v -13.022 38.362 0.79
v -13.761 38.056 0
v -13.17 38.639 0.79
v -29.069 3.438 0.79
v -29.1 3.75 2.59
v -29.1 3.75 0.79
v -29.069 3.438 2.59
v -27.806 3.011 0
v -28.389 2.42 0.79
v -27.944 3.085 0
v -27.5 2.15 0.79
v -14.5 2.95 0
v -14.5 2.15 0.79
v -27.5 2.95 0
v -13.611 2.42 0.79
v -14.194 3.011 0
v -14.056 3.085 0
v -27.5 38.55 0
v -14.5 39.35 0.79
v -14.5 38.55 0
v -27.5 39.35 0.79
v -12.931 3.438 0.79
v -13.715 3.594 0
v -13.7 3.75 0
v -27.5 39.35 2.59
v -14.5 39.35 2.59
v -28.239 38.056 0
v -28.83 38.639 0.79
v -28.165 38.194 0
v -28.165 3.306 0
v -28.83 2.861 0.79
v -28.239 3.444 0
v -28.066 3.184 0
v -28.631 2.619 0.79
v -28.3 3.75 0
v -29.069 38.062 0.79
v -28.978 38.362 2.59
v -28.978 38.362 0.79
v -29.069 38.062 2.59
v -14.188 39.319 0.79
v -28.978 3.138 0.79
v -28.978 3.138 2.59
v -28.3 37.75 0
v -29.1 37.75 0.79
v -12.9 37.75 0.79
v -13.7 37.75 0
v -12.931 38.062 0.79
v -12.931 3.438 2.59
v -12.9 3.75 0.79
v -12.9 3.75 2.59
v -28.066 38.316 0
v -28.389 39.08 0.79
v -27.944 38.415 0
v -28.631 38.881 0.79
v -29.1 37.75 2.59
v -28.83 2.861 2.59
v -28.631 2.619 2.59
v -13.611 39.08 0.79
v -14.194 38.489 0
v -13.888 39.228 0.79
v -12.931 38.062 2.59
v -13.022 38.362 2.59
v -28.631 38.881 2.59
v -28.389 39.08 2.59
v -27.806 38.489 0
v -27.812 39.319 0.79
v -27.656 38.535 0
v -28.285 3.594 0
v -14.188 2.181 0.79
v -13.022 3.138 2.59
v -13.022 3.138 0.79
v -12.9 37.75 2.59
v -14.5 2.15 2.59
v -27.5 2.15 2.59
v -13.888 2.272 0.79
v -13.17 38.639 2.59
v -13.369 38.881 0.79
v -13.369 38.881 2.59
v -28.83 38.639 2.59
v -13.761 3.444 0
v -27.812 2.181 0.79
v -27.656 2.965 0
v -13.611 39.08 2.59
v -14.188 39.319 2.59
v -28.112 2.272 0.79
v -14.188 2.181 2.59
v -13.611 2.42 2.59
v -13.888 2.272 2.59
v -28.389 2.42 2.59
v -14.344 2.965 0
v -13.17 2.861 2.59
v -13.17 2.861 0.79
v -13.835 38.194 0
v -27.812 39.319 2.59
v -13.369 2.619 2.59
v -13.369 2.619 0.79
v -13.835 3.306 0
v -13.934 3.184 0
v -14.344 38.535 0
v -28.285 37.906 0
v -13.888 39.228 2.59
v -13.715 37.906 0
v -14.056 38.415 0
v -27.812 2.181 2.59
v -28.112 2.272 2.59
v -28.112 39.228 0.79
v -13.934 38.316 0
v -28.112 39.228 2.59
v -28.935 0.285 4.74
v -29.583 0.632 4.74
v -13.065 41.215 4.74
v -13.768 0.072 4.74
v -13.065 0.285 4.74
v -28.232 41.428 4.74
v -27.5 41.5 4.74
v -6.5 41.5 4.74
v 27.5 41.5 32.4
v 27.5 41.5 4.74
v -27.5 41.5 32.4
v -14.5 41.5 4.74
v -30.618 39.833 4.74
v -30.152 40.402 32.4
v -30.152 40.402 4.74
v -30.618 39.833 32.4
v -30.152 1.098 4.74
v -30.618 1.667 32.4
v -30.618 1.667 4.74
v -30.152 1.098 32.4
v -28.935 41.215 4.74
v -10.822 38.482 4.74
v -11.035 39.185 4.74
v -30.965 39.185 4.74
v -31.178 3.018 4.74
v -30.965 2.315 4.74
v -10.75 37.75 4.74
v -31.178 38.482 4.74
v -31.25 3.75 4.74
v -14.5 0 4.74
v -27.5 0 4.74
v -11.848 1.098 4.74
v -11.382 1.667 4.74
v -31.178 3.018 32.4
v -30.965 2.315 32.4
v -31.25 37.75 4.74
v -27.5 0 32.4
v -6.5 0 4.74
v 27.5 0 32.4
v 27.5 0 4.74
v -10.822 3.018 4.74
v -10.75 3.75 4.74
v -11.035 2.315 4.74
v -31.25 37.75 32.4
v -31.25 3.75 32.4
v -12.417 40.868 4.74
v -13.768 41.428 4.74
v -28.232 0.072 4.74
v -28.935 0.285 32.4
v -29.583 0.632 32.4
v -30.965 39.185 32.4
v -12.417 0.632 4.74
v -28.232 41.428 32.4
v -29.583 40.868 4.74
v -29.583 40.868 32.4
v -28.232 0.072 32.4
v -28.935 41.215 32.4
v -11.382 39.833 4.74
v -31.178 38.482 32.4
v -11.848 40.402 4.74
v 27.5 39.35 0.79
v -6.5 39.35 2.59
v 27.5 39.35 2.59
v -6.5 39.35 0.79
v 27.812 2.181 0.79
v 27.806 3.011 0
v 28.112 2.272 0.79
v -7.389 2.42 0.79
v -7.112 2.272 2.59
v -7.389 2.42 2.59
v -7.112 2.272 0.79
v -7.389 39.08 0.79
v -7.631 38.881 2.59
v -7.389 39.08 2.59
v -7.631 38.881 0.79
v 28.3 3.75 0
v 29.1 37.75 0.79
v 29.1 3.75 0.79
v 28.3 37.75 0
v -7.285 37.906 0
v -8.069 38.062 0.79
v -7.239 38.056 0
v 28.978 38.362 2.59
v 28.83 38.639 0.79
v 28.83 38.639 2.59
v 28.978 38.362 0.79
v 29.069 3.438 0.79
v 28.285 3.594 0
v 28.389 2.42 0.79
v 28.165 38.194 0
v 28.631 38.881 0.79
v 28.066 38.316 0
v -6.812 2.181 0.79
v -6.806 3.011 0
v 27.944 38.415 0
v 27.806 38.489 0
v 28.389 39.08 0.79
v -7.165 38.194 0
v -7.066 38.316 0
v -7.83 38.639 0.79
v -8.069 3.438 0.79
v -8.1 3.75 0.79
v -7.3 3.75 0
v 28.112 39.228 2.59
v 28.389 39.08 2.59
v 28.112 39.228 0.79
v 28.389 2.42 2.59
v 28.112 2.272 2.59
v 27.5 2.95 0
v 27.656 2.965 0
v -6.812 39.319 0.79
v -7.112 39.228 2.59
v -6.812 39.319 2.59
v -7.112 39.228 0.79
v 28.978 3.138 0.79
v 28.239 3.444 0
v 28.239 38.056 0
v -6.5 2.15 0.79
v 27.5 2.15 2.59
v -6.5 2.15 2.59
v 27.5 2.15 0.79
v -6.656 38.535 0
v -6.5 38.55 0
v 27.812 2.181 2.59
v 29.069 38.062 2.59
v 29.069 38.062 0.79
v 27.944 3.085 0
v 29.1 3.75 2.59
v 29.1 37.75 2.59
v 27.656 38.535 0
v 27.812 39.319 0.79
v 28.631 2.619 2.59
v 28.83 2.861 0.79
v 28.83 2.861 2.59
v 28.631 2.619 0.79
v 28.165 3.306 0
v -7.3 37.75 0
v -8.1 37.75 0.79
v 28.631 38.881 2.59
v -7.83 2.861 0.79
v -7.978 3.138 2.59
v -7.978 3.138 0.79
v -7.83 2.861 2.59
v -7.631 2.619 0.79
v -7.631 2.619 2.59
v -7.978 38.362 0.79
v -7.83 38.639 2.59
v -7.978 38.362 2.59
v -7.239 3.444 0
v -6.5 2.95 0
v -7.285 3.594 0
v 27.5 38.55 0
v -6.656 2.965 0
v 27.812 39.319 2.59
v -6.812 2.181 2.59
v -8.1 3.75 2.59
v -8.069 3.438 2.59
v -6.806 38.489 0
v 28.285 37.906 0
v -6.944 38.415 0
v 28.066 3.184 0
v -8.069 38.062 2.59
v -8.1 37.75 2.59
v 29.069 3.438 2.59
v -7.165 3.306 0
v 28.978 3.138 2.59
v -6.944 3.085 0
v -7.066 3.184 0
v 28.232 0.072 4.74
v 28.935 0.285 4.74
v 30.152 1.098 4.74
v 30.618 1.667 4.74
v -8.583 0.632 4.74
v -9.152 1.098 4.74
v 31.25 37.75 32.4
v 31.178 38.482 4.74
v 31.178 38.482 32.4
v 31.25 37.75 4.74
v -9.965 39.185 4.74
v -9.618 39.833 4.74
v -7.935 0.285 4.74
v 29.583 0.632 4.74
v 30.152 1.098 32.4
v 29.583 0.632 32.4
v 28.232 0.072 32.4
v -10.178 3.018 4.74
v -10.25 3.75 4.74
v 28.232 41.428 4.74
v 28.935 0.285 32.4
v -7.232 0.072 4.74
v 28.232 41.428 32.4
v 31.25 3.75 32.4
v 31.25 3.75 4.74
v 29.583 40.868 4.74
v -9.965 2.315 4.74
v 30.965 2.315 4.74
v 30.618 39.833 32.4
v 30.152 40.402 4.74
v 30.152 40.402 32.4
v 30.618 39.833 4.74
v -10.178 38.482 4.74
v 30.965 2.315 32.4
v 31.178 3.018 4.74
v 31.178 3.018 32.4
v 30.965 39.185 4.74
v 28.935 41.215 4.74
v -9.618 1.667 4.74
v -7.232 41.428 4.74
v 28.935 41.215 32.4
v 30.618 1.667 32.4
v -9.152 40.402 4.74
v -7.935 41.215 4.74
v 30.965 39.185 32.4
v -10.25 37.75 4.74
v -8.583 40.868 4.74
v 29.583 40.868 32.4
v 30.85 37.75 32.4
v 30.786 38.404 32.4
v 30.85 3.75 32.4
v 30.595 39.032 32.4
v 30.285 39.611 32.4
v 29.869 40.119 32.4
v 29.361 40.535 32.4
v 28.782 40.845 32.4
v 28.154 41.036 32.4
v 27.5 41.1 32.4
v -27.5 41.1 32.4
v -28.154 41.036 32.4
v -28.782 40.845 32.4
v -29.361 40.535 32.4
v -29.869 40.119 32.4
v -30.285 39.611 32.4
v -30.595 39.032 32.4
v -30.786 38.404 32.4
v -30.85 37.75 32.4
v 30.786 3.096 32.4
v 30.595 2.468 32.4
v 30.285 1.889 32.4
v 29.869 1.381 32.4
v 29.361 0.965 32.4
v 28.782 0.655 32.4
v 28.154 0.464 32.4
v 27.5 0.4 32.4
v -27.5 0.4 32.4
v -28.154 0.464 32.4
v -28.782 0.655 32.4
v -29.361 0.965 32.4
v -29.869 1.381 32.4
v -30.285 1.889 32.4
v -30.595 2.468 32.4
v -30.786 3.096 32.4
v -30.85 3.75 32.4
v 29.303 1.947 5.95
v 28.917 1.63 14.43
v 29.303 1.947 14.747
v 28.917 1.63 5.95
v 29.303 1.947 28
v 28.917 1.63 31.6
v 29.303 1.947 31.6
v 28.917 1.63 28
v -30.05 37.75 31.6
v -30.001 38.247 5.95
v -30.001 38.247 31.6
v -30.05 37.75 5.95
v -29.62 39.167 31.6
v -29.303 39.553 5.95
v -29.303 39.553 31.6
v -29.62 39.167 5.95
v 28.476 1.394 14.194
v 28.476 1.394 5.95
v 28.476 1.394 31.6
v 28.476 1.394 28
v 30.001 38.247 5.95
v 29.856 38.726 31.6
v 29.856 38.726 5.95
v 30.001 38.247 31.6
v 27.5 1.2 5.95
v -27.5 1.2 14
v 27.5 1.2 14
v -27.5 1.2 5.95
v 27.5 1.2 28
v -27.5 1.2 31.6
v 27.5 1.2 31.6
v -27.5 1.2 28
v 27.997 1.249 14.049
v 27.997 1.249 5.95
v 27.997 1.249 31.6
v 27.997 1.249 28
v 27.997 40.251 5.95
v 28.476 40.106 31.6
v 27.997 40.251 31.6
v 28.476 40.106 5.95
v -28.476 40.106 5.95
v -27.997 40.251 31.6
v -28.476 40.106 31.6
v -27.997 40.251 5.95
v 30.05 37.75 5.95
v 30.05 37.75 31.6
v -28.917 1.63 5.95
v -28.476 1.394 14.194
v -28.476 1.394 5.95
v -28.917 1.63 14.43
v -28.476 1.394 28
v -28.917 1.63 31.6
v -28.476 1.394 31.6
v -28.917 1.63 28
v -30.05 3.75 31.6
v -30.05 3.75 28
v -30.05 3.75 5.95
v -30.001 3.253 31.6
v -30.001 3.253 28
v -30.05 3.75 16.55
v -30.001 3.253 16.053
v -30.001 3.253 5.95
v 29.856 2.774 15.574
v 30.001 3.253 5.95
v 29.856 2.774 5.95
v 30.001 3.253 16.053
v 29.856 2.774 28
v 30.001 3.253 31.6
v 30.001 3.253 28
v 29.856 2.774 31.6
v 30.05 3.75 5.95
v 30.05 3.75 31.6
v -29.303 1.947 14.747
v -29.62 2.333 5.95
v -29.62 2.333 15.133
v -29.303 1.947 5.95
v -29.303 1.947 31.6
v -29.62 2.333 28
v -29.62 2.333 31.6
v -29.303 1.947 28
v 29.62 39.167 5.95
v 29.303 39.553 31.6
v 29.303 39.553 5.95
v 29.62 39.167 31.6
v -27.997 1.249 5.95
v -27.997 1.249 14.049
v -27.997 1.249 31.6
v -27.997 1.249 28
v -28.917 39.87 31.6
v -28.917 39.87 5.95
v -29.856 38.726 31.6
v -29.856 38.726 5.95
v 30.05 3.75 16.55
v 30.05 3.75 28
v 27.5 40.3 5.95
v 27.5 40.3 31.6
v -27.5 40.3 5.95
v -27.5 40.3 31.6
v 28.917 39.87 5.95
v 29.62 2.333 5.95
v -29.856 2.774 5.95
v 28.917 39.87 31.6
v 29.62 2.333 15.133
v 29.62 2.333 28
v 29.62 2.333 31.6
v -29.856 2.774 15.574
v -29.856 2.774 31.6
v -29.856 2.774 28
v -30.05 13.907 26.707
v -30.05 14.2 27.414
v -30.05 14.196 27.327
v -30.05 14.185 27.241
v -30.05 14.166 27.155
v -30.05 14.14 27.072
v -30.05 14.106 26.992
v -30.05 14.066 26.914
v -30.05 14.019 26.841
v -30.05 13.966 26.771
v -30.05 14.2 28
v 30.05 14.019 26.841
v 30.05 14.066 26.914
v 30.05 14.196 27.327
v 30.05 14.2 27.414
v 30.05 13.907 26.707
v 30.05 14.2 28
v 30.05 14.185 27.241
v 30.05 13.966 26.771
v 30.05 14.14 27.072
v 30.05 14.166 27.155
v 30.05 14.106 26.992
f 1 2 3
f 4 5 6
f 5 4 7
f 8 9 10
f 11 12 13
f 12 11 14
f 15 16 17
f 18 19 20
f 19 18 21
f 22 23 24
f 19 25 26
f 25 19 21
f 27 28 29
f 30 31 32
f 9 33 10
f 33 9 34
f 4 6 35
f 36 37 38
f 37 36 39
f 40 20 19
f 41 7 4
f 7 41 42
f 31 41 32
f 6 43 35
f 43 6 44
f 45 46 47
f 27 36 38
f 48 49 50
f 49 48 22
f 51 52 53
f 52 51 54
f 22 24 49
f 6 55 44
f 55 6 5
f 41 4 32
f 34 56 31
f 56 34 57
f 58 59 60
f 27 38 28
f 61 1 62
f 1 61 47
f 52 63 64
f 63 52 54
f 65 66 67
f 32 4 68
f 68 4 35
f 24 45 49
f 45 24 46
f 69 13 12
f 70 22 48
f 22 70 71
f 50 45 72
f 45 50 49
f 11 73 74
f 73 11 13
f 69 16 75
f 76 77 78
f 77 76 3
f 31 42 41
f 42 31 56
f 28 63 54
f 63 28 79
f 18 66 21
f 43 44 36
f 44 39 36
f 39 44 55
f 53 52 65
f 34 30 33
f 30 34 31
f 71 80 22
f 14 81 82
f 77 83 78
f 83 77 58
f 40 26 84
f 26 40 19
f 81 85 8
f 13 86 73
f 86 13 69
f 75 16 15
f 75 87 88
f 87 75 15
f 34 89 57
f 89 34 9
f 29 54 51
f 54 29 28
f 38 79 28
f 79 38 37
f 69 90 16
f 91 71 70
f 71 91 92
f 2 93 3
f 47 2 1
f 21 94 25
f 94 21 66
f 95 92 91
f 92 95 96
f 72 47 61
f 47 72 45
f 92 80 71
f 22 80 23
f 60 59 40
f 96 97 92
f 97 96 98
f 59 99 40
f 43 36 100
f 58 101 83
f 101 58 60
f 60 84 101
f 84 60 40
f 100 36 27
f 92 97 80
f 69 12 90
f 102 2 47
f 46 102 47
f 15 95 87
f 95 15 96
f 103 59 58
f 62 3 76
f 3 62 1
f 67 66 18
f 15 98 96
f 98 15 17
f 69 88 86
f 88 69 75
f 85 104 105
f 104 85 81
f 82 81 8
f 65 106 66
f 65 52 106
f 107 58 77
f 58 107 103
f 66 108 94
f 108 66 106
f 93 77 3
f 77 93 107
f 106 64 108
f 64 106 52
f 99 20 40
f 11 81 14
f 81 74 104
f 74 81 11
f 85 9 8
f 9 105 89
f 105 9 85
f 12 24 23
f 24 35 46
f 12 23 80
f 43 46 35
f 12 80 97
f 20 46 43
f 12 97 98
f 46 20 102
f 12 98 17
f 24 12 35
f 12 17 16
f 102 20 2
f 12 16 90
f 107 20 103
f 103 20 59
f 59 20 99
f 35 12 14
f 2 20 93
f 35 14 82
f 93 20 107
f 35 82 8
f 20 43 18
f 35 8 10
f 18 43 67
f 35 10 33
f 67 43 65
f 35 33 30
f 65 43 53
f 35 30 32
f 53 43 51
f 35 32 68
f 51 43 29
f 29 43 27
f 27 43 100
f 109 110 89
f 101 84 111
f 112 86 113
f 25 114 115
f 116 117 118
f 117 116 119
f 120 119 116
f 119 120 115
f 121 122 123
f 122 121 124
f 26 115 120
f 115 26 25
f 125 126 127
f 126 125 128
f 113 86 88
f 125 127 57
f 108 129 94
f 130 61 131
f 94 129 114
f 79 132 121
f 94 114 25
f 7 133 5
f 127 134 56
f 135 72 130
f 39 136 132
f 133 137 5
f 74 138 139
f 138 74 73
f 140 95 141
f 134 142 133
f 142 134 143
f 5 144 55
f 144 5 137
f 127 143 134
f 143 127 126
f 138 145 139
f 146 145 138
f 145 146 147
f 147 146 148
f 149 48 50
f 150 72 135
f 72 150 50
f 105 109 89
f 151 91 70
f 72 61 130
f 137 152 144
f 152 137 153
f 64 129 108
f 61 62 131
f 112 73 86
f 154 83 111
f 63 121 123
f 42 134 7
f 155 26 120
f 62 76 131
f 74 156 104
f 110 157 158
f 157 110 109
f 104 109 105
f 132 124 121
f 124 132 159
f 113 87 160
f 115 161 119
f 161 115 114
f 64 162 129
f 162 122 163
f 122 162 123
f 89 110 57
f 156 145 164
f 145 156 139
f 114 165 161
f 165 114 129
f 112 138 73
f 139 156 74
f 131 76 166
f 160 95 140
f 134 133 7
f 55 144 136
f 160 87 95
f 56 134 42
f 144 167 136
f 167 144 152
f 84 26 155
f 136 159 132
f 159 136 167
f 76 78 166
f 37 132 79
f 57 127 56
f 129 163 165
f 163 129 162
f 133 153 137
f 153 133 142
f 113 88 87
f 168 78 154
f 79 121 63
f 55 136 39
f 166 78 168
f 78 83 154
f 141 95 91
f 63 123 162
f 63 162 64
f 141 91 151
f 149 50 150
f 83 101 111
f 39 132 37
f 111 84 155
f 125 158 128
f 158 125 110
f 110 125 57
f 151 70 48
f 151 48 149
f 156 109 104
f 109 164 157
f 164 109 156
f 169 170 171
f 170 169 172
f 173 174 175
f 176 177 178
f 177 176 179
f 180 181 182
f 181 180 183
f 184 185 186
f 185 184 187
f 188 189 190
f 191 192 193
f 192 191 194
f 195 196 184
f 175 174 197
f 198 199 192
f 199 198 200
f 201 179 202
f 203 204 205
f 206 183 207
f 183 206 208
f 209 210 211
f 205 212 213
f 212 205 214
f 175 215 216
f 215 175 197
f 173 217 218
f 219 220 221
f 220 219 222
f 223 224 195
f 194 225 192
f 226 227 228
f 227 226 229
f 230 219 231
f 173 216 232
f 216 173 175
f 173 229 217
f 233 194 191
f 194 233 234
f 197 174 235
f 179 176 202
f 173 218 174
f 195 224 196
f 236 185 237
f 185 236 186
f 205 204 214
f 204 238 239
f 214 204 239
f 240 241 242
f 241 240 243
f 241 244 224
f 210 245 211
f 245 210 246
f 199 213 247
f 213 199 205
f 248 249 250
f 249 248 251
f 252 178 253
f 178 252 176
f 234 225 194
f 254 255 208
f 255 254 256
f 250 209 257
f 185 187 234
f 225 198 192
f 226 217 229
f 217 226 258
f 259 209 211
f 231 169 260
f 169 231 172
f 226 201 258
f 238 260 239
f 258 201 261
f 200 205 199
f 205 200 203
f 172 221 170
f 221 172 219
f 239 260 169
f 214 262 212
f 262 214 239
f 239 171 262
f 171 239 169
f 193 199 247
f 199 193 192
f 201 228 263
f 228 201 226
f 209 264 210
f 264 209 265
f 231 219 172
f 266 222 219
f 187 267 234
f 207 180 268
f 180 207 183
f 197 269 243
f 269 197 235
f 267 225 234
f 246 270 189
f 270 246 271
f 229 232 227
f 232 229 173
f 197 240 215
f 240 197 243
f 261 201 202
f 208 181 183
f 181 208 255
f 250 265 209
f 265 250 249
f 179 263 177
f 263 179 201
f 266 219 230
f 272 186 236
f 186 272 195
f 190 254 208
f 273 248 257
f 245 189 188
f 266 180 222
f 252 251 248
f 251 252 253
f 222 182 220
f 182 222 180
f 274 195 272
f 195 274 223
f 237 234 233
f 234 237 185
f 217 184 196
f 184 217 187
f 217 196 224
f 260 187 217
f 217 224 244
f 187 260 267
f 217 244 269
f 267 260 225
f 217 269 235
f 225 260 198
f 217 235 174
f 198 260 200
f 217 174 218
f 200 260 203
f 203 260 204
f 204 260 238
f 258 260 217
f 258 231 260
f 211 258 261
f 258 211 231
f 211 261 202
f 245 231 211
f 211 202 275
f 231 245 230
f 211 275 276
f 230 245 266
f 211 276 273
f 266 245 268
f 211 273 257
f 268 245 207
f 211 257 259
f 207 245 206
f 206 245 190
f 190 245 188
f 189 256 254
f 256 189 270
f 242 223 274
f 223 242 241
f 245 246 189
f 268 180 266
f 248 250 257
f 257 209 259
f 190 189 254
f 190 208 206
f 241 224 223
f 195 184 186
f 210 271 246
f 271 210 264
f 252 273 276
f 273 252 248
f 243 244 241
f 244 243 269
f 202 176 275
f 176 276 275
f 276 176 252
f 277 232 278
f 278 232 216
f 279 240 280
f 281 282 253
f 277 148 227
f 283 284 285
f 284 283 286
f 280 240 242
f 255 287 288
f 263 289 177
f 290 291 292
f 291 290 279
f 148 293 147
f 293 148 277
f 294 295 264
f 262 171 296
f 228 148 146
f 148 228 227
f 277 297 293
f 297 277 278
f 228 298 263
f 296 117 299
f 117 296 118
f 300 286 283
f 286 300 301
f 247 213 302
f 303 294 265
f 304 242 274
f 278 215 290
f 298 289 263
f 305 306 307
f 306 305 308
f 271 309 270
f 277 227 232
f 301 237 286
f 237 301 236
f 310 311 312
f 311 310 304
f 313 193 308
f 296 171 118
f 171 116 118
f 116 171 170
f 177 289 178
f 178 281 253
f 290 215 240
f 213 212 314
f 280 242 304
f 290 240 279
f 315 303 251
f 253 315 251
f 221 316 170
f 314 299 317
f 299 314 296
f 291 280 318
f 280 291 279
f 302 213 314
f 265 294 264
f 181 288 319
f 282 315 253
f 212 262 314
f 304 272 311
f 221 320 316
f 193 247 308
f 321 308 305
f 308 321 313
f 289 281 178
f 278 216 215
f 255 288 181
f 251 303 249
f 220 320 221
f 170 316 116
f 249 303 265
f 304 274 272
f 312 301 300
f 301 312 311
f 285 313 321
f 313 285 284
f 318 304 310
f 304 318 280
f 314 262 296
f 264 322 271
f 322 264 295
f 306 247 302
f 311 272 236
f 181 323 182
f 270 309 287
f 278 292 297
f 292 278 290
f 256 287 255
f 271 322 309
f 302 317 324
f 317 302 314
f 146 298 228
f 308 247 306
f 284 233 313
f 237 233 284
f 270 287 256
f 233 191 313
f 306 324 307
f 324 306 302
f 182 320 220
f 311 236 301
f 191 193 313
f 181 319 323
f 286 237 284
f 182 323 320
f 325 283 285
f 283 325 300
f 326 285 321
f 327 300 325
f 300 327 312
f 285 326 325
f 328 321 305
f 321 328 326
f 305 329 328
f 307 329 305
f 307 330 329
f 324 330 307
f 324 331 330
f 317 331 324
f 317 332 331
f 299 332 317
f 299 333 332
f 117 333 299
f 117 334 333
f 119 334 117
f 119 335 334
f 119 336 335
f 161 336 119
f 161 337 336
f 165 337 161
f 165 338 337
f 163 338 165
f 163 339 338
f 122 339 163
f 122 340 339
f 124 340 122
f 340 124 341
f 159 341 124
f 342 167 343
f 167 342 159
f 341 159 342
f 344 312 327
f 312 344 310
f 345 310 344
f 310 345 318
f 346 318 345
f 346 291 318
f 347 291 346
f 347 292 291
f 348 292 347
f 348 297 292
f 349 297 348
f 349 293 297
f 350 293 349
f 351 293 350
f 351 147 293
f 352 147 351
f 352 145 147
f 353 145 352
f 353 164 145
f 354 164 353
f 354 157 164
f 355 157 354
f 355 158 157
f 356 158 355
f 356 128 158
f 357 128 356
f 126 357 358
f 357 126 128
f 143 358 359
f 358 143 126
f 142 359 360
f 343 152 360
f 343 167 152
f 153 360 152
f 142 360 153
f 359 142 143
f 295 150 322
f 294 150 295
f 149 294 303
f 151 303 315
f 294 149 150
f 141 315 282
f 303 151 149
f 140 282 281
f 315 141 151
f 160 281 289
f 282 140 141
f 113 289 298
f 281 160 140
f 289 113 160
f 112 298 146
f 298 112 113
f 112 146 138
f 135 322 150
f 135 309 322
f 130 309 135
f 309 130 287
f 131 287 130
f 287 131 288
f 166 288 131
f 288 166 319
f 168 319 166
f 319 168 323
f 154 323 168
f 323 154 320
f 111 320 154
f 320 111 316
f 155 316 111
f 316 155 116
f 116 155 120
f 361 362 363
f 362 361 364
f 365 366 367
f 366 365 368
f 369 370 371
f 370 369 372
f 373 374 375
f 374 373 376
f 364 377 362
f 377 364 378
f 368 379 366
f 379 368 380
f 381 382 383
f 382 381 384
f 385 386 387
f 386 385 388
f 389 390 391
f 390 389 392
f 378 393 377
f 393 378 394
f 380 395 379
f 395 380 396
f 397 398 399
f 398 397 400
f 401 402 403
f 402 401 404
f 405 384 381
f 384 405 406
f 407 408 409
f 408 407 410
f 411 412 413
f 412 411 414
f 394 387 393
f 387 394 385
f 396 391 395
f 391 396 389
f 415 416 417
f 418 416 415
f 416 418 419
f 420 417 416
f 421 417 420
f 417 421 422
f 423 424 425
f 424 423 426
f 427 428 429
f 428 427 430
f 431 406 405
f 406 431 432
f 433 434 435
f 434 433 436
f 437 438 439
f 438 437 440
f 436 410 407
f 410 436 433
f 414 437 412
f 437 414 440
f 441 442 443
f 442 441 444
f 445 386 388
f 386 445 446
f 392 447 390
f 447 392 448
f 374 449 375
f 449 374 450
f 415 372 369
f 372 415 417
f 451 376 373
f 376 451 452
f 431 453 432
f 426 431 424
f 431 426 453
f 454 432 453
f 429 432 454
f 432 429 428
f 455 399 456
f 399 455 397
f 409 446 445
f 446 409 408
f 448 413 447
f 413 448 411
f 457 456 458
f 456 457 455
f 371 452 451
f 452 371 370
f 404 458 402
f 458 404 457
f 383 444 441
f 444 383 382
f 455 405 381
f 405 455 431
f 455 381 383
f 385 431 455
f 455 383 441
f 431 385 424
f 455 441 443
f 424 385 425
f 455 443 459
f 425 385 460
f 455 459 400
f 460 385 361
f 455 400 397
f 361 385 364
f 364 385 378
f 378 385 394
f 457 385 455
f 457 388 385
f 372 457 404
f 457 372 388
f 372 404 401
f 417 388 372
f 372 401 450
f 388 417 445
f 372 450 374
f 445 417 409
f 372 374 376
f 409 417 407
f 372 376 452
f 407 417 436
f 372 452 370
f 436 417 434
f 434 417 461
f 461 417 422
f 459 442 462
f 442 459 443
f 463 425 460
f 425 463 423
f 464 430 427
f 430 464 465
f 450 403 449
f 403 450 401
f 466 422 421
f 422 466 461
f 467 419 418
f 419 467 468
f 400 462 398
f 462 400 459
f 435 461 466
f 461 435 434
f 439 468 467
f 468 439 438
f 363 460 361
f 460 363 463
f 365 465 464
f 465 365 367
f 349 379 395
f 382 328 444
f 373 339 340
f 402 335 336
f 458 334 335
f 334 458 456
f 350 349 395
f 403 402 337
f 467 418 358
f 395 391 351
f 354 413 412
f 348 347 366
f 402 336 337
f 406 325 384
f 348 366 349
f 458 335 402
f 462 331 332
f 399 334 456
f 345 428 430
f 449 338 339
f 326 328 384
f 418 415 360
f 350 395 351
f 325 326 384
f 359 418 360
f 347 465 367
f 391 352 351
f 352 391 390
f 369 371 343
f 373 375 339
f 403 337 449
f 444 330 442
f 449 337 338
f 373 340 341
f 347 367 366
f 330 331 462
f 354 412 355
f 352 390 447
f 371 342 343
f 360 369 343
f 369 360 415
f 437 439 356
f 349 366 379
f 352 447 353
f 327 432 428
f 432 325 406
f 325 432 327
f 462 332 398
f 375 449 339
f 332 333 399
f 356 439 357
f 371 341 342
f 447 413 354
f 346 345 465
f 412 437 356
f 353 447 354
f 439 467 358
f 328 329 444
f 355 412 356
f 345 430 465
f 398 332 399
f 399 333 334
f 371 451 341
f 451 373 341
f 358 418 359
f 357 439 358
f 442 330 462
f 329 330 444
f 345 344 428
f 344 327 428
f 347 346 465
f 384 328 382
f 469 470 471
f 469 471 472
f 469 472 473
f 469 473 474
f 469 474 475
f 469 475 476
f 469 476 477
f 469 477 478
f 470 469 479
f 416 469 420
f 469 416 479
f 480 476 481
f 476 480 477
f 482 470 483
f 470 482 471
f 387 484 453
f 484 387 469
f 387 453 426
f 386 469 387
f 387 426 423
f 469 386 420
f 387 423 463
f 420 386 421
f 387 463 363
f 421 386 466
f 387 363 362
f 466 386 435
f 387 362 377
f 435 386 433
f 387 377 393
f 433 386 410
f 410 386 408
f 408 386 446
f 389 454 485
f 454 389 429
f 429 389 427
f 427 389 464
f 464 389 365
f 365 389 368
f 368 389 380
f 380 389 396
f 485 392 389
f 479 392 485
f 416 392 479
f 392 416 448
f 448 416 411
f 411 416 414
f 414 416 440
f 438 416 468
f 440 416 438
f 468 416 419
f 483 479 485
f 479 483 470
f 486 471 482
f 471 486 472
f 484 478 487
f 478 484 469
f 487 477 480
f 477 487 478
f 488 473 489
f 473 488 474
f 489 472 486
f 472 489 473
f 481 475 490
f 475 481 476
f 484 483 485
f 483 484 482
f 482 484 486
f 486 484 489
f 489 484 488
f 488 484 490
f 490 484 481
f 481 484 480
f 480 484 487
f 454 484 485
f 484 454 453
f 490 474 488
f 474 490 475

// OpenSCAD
// file: ../../../modules/gridfinity.scad
// Gridfinity ベースプレートの共有 module。
// 寸法は Gridfinity 仕様 (Zack Freedman) の baseplate 輪郭に従う:
//   ピッチ 42、ソケット上端開口 41.5 (角 R4)、上から 45° 面取り 2.15 →
//   垂直 1.8 (37.2 角・R1.85) → 45° 面取り 0.7 → 底 35.8 角 (R1.15)。
//   ソケット深さ = 2.15 + 1.8 + 0.7 = 4.65。
//
// 座標系: X が列方向 (中央が 0)、Y が行方向 (板の前端が 0)、Z=0 が板の底面。
// 板の外形は grid とは独立に rim で与えるので、grid より大きい板 (縁付き) を
// 作れる。ソケットは rim=[left, right, front, back] の内側へ 42 ピッチで並ぶ。

gf_pitch = 42;
gf_socket_top = 41.5; // 上端開口
gf_socket_mid = 37.2; // 垂直部
gf_socket_bot = 35.8; // 底
gf_socket_r_top = 4;
gf_socket_r_mid = 1.85;
gf_socket_r_bot = 1.15;
gf_chamfer_top = 2.15;
gf_wall_h = 1.8;
gf_chamfer_bot = 0.7;
gf_socket_depth = gf_chamfer_top + gf_wall_h + gf_chamfer_bot; // 4.65
gf_fn = 32;
gf_eps = 0.01; // hull 用の薄板の厚さ
gf_over = 0.5; // 切削の抜き代

// 角丸正方形または矩形 (w は一辺、または [幅, 奥行き]、角 R)
module
gf_rounded_square(w, r)
{
    offset(r = r, $fn = gf_fn)
        square(is_list(w) ? w - [ 2 * r, 2 * r ] : w - 2 * r, center = true);
}

// 厚さ gf_eps の角丸正方形の薄板を z に置く (hull の骨)
module
gf_slab(w, r, z)
{
    translate([ 0, 0, z ]) linear_extrude(gf_eps) gf_rounded_square(w, r);
}

// ソケット1個の切削体。z=0 がソケットの底 (床の天面)、+Z へ 4.65 で天面に出る。
// clearance は嵌合の逃げで、輪郭を全周へ clearance だけ外へ出す (幅 +2c、角 R
// +c)。pitch_x は X 方向のセル幅。端数でも角 R と面取りの寸法を保つ。
module
gf_socket_cut(clearance = 0, pitch_x = gf_pitch)
{
    z1 = gf_chamfer_bot;
    z2 = z1 + gf_wall_h;
    z3 = gf_socket_depth;
    c = clearance;
    assert(pitch_x > gf_pitch - gf_socket_top + 2 * gf_socket_r_top,
           "Cell width is too small for the socket corner radius");
    delta = [ pitch_x - gf_pitch, 0 ];
    bot = [ gf_socket_bot + 2 * c, gf_socket_bot + 2 * c ] + delta;
    mid = [ gf_socket_mid + 2 * c, gf_socket_mid + 2 * c ] + delta;
    top = [ gf_socket_top + 2 * c, gf_socket_top + 2 * c ] + delta;
    hull()
    {
        gf_slab(bot, gf_socket_r_bot + c, 0);
        gf_slab(mid, gf_socket_r_mid + c, z1 - gf_eps);
    }
    hull()
    {
        gf_slab(mid, gf_socket_r_mid + c, z1 - gf_eps);
        gf_slab(mid, gf_socket_r_mid + c, z2 - gf_eps);
    }
    hull()
    {
        gf_slab(mid, gf_socket_r_mid + c, z2 - gf_eps);
        gf_slab(top, gf_socket_r_top + c, z3 - gf_eps);
    }
    // 天面より上へ抜く (天面と同一平面の退化した面を残さない)
    gf_slab(top, gf_socket_r_top + c, z3 - gf_eps);
    translate([ 0, 0, z3 - gf_eps ]) linear_extrude(gf_over + gf_eps)
        gf_rounded_square(top, gf_socket_r_top + c);
}

// ベースプレート。cols x rows のソケットを床 floor_t の上に彫る。
// rim = [left, right, front, back] はソケット列の外側に残す縁の幅。
// 板の幅 = cols*42 + left + right、奥行き = rows*42 + front + back。
// cols の端数は左端の細幅セルになる。rows は正の整数。
// clearance はソケットの嵌合の逃げ (gf_socket_cut を参照)。
module
gf_baseplate(cols, rows, rim = [ 0, 0, 0, 0 ], floor_t = 1, clearance = 0)
{
    grid_w = cols * gf_pitch;
    grid_d = rows * gf_pitch;
    plate_w = grid_w + rim[0] + rim[1];
    plate_d = grid_d + rim[2] + rim[3];
    x0 = -plate_w / 2 + rim[0]; // ソケット列の左端
    first_pitch = grid_w - (ceil(cols) - 1) * gf_pitch;
    difference()
    {
        translate([ -plate_w / 2, 0, 0 ])
            cube([ plate_w, plate_d, floor_t + gf_socket_depth ]);
        for (c = [0:ceil(cols) - 1], r = [0:rows - 1])
            translate([
                x0 + (c == 0 ? first_pitch / 2
                             : first_pitch + (c - 0.5) * gf_pitch),
                rim[2] + (r + 0.5) * gf_pitch,
                floor_t
            ]) gf_socket_cut(clearance, c == 0 ? first_pitch : gf_pitch);
    }
}
// file: ../../../modules/gridfinity_bins.scad
include <gridfinity_bin.scad>

// assets/gridfinity-bin/ の bin 群の共通値と、サイズ 3 引数の払い出し口。
// 単体では何も描かない。設計の経緯と確定値は
// ledger/designs/gridfinity-bin-4u.md が正本。
// 通常binは4U/9U、X={1,1.5,2,2.5,3} × Y={1,2,3,4,5,5.5}。
// 両軸に端数を持つ組み合わせはassetに置かない（各高さ28種）。
// Xが横、Yがラベルの壁から奥、unitsが高さ（7mm単位）。
wall = 1.2;    // 0.4 ノズル 3 本
floor_t = 1.2; // 底 (4.75) の上に載せる床。床の天面 z = 5.95
label_d = 13;  // 12mm 幅のラベルシールを貼る天板の張り出し
label_t = 1; // 天板の厚さ (user 指定)。下は 45° の無垢のくさび
label_r = 1; // 天板の先端と 45° 面の境目の R (user 指定)
// カードケース (goods/card_case_2x3x4u.scad) の値。カードは ISO/IEC 7810 ID-1 (85.6 × 54 ×
// 0.76、隅 R3) で、長辺を Y (rows 方向) に寝かせ、X 中央・手前の壁から 10 奥に置く。ポケットは
// カードより 1 大きい (片側 0.5)。右奥のマスは壁の内面まで抜き、床と底を外形に平行な 45° の窪みにする。
// ポケットの左右の埋めの天面 (幅 13.05) が 12mm のラベルを貼る帯。ポケットと穴の交点の
// 縦エッジは丸める (開口の上縁は丸めない: 壁を上端まで垂直に保ち、収まる枚数を減らさない)
card_w = 54;    // カードの短辺 (X)。user 指定「高さ 54」
card_d = 85.6;  // カードの長辺 (Y)。user 指定「幅 85.6」
card_clear = 1; // ポケットの余裕 (user 指定「+1mm」)
// ポケットの手前の辺の、手前の壁の内面からの距離 (user 指定「10mm」)
card_off = 10;
// ポケットの平面の隅 R (user 指定「角の丸み 3mm」。ID-1 の隅は 2.88..3.48)
card_r = 3;
// ポケットと穴が交わる所の、埋めの凸の縦エッジの R (指の当たる角)
card_edge_r = 2;
recess_skin = floor_t + 1.75; // 窪みの床 z (底の皮)。user 指定「壁厚と同じ 1.2 は過剰、1.75 返す」

function bin_contract(cols, rows, units) = str("CONTRACT units=",
                                               units,
                                               " pitch=",
                                               gf_pitch,
                                               " outer=",
                                               gfb_outer,
                                               " h=",
                                               units* gfb_unit,
                                               " lip=",
                                               gfb_lip_h,
                                               " base=",
                                               gfb_base_bot,
                                               "/",
                                               gfb_base_mid,
                                               "/",
                                               gfb_outer,
                                               " base_h=",
                                               gfb_base_h,
                                               " wall=",
                                               wall,
                                               " floor_top=",
                                               gfb_base_h + floor_t,
                                               " label=",
                                               label_d,
                                               "x",
                                               label_t,
                                               " wedge=45 fillet=",
                                               label_r,
                                               " bin=",
                                               cols,
                                               "x",
                                               rows,
                                               " size=",
                                               cols* gf_pitch - 0.5,
                                               "x",
                                               rows* gf_pitch - 0.5);

// (cols, rows, units) でラベル付き bin を払い出す。例: gridfinity_bin(2, 4, 4)
module
gridfinity_bin(cols, rows, units = 4)
{
    echo(bin_contract(cols, rows, units));
    gfb_bin(cols, rows, units, wall, floor_t, label_d, label_t, label_r);
}

function card_contract(cols, rows, units) = str("CONTRACT card units=",
                                                units,
                                                " bin=",
                                                cols,
                                                "x",
                                                rows,
                                                " size=",
                                                cols* gf_pitch - 0.5,
                                                "x",
                                                rows* gf_pitch - 0.5,
                                                " h=",
                                                units* gfb_unit,
                                                " lip=",
                                                gfb_lip_h,
                                                " floor_top=",
                                                gfb_base_h + floor_t,
                                                " card=",
                                                card_w,
                                                "x",
                                                card_d,
                                                " pocket=",
                                                card_w + card_clear,
                                                "x",
                                                card_d + card_clear,
                                                " at=",
                                                -(card_w + card_clear) / 2,
                                                ",",
                                                wall + card_off,
                                                " hole=",
                                                (cols - 1) / 2 * gf_pitch - gfb_outer / 2,
                                                ",",
                                                (rows - 0.5) * gf_pitch - 0.25 - gfb_outer / 2,
                                                " hole_r=",
                                                gfb_outer_r - wall,
                                                " recess=",
                                                gfb_outer - 2 * wall,
                                                "/",
                                                gfb_base_mid - 2 * wall,
                                                " recess_floor=",
                                                recess_skin,
                                                " r=",
                                                card_r,
                                                " edge_r=",
                                                card_edge_r);

// (cols, rows, units) でカードケースを払い出す。例: gridfinity_card_case(2, 3, 4)
module
gridfinity_card_case(cols, rows, units = 4)
{
    echo(card_contract(cols, rows, units));
    gfb_card_case(cols,
                  rows,
                  units,
                  wall,
                  floor_t,
                  [ card_w, card_d ],
                  card_clear,
                  card_off,
                  card_r,
                  recess_skin,
                  card_edge_r);
}
// main file
include <../../../modules/gridfinity_bins.scad>

gridfinity_bin(1.5, 1, 4);
